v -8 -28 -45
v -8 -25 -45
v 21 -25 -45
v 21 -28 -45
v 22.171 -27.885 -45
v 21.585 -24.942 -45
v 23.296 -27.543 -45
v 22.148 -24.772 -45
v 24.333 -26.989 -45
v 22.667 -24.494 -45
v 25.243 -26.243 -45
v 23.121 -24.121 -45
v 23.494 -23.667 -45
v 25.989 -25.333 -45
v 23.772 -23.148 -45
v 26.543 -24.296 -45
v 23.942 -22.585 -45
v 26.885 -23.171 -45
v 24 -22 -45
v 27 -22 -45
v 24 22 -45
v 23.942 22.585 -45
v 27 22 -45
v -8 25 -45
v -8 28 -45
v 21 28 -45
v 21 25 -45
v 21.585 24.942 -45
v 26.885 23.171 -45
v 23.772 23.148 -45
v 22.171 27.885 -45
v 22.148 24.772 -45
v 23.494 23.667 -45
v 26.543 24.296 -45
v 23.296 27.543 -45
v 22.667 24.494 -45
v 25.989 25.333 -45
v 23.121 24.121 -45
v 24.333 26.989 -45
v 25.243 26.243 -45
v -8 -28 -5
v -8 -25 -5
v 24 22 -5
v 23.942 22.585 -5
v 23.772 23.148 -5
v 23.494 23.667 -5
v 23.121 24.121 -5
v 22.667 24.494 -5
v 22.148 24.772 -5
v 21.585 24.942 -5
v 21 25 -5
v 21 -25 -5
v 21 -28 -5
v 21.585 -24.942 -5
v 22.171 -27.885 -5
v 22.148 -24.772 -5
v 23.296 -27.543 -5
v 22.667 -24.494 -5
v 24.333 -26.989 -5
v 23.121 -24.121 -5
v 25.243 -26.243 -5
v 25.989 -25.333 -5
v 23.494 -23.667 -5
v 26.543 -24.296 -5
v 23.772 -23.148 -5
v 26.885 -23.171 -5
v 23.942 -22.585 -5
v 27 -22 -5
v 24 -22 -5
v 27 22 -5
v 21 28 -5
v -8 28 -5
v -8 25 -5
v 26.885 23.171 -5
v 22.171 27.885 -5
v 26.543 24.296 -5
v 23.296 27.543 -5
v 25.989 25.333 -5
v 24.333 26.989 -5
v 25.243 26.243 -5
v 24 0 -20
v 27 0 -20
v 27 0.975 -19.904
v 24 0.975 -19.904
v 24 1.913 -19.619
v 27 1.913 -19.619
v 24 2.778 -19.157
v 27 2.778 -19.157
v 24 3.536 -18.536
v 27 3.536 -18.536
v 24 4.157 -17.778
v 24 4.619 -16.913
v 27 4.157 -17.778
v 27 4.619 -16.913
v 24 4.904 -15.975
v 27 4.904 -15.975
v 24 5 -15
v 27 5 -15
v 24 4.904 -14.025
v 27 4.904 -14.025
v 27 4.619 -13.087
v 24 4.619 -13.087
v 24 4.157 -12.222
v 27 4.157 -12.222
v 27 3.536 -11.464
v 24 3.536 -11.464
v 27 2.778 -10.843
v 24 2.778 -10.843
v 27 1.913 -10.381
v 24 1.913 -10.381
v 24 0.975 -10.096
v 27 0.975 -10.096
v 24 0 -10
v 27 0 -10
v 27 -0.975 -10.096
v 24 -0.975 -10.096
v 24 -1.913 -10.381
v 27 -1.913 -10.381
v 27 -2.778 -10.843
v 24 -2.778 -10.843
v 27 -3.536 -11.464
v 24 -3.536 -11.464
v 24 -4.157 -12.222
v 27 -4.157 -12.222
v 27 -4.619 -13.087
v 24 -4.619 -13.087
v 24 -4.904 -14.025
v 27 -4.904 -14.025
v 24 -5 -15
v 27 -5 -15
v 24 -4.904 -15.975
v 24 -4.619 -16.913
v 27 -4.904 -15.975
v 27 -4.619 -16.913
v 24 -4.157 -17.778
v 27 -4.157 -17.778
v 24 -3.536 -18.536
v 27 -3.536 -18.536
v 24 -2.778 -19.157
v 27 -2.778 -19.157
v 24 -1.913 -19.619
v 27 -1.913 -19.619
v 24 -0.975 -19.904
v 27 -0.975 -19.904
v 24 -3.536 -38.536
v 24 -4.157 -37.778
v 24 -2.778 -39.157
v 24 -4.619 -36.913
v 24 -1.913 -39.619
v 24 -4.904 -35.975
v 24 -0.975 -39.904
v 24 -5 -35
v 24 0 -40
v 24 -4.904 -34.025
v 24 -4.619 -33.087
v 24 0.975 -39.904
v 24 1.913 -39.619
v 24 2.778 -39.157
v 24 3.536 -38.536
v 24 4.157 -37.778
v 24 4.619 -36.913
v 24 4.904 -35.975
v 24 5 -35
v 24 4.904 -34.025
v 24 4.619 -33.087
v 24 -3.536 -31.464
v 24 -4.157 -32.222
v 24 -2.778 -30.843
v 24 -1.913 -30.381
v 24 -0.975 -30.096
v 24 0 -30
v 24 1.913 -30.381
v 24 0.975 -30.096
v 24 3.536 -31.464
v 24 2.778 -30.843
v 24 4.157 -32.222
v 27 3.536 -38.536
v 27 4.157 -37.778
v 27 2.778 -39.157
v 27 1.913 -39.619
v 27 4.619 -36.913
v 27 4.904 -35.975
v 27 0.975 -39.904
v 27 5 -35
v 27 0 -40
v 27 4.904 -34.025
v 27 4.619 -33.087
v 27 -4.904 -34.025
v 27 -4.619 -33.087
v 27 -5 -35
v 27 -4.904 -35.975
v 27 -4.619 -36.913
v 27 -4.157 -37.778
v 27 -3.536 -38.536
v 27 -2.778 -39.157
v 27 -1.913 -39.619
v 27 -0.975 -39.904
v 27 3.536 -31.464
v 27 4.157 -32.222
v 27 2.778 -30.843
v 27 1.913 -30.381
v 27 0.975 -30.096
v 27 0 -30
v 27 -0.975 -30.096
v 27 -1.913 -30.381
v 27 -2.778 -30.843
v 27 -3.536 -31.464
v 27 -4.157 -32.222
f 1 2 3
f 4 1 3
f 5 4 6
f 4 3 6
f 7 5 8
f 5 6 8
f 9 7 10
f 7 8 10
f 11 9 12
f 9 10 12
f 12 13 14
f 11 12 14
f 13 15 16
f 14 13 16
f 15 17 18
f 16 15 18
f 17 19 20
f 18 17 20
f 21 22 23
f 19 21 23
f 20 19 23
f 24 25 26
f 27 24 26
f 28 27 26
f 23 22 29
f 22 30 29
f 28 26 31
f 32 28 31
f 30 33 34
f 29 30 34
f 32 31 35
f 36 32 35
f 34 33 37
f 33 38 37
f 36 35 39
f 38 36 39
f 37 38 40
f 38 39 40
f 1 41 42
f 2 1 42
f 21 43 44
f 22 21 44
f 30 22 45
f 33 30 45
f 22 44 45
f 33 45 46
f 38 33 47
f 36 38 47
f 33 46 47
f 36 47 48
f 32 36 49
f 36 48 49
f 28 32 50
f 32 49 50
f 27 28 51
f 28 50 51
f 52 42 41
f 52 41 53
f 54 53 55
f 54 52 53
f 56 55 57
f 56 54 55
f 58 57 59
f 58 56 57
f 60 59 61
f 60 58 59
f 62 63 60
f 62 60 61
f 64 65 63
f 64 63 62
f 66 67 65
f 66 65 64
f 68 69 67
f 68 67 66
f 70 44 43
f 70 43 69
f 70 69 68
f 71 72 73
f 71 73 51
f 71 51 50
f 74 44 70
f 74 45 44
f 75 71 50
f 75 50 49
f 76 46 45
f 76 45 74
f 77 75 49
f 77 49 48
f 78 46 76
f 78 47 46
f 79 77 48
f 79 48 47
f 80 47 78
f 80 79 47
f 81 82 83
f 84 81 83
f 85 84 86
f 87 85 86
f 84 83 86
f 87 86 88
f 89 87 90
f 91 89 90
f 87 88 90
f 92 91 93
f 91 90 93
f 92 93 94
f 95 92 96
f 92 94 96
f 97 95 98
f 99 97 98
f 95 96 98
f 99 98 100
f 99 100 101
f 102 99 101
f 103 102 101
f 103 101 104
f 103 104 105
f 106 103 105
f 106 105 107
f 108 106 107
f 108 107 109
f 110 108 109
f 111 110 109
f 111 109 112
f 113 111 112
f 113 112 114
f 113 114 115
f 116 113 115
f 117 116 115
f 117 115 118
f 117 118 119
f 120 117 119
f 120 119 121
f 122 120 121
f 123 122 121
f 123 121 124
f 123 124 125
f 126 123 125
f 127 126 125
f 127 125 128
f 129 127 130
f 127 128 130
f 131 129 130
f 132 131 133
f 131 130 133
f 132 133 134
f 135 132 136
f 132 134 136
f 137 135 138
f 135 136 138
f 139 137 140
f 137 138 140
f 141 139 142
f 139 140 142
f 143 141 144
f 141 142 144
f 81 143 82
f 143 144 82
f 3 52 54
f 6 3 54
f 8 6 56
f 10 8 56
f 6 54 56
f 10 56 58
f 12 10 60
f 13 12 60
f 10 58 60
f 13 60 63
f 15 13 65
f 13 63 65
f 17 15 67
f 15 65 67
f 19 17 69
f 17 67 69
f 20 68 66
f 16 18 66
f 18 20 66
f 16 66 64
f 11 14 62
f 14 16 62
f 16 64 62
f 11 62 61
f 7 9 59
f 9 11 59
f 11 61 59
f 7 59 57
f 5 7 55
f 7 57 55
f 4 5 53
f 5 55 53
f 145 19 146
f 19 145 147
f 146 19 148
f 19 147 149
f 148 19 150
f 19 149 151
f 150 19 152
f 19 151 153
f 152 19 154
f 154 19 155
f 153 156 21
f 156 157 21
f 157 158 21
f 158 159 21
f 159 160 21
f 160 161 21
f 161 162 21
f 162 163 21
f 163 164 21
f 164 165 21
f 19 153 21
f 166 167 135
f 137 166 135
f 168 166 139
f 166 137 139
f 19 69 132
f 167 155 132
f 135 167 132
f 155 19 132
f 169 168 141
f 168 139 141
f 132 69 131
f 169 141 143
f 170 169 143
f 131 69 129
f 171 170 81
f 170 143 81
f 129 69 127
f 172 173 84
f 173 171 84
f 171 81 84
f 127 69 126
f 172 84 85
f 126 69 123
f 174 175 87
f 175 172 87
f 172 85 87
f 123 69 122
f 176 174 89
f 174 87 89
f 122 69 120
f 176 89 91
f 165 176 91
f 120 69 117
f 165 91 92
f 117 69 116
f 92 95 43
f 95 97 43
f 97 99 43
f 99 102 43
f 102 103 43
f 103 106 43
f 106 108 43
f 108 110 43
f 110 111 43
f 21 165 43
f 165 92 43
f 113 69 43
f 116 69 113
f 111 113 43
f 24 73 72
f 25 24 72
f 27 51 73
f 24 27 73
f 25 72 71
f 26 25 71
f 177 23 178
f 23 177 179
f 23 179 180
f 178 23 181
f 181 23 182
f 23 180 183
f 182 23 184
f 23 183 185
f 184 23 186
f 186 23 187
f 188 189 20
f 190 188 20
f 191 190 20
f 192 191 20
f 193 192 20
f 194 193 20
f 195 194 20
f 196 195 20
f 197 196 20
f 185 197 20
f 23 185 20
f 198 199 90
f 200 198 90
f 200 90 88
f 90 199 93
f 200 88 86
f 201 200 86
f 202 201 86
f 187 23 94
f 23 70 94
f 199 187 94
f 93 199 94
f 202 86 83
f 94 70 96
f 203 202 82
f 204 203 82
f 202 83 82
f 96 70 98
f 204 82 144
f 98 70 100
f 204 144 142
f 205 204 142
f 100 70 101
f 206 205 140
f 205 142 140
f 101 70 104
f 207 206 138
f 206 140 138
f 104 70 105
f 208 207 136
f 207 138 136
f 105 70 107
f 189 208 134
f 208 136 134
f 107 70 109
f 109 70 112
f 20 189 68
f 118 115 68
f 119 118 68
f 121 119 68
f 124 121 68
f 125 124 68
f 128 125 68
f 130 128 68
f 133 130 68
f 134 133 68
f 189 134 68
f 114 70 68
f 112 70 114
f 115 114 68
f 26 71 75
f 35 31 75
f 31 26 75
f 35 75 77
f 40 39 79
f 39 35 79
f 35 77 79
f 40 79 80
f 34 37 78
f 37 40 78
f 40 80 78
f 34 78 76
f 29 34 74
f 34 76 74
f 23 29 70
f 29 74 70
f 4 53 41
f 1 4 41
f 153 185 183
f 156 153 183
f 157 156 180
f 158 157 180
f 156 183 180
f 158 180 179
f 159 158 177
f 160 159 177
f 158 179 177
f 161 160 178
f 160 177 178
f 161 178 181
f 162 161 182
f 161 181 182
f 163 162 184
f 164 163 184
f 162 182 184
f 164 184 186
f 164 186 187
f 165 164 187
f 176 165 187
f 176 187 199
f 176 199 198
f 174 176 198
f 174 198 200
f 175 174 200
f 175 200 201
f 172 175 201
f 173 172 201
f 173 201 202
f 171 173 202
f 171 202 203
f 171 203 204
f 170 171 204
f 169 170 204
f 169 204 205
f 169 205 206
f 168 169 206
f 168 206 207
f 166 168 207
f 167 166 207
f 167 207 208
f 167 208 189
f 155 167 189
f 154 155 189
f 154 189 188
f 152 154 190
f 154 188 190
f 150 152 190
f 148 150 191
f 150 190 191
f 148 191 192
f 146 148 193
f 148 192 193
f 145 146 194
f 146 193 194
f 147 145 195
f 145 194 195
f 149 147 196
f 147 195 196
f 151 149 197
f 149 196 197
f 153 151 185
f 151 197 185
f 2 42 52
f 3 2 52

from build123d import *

# Parameters (mm, degrees)
BASE_FLANGE1_DEPTH = 50
SKETCH10_R         = 5
CUT_EXTRUDE2_DEPTH = 68.149087857
FILLET1_R          = 3
SKETCH11_W         = 62.490132504
SKETCH11_H         = 65.671220534
CUT_EXTRUDE4_DEPTH = 5


# Sheet-metal steps are written as plain solids
with BuildPart() as part:
    # Sketch3 → Base-Flange1 (new body)
    with BuildSketch(Plane.XY):
        with BuildLine():
            Line((-8, -25), (21, -25))
            ThreePointArc((21, -25), (23.121320344, -24.121320344), (24, -22))
            Line((24, -22), (24, 22))
            ThreePointArc((24, 22), (23.121320344, 24.121320344), (21, 25))
            Line((21, 25), (-8, 25))
            Line((-8, 25), (-8, 28))
            Line((-8, 28), (21, 28))
            ThreePointArc((21, 28), (25.242640687, 26.242640687), (27, 22))
            Line((27, 22), (27, -22))
            ThreePointArc((27, -22), (25.242640687, -26.242640687), (21, -28))
            Line((21, -28), (-8, -28))
            Line((-8, -28), (-8, -25))
        make_face()
    extrude(amount=-BASE_FLANGE1_DEPTH)

    # Sketch10 → Cut-Extrude2 (cut, through all)
    with BuildSketch(Plane(origin=(27, 0, 0), x_dir=(0, 0, -1), z_dir=(1, 0, 0))):
        with Locations((15, 0)):
            Circle(SKETCH10_R)
        with Locations((35, 0)):
            Circle(SKETCH10_R)
    extrude(amount=-CUT_EXTRUDE2_DEPTH, mode=Mode.SUBTRACT)

    # Fillet1
    fillet1_edges = [part.edges().sort_by_distance(p)[0] for p in [
        (-8, 26.5, 0),
        (-8, -26.5, 0),
        (-8, 26.5, -50),
        (-8, -26.5, -50),
    ]]
    fillet(fillet1_edges, radius=FILLET1_R)

    # Sketch11 → Cut-Extrude4 (cut)
    with BuildSketch(Plane.XY):
        Rectangle(SKETCH11_W, SKETCH11_H)
    cut_extrude4 = extrude(amount=-CUT_EXTRUDE4_DEPTH, mode=Mode.SUBTRACT)

    # Mirror1: Cut-Extrude4 across plane
    add(cut_extrude4.mirror(Plane.XY.offset(-25)), mode=Mode.SUBTRACT)


solid = part.part
